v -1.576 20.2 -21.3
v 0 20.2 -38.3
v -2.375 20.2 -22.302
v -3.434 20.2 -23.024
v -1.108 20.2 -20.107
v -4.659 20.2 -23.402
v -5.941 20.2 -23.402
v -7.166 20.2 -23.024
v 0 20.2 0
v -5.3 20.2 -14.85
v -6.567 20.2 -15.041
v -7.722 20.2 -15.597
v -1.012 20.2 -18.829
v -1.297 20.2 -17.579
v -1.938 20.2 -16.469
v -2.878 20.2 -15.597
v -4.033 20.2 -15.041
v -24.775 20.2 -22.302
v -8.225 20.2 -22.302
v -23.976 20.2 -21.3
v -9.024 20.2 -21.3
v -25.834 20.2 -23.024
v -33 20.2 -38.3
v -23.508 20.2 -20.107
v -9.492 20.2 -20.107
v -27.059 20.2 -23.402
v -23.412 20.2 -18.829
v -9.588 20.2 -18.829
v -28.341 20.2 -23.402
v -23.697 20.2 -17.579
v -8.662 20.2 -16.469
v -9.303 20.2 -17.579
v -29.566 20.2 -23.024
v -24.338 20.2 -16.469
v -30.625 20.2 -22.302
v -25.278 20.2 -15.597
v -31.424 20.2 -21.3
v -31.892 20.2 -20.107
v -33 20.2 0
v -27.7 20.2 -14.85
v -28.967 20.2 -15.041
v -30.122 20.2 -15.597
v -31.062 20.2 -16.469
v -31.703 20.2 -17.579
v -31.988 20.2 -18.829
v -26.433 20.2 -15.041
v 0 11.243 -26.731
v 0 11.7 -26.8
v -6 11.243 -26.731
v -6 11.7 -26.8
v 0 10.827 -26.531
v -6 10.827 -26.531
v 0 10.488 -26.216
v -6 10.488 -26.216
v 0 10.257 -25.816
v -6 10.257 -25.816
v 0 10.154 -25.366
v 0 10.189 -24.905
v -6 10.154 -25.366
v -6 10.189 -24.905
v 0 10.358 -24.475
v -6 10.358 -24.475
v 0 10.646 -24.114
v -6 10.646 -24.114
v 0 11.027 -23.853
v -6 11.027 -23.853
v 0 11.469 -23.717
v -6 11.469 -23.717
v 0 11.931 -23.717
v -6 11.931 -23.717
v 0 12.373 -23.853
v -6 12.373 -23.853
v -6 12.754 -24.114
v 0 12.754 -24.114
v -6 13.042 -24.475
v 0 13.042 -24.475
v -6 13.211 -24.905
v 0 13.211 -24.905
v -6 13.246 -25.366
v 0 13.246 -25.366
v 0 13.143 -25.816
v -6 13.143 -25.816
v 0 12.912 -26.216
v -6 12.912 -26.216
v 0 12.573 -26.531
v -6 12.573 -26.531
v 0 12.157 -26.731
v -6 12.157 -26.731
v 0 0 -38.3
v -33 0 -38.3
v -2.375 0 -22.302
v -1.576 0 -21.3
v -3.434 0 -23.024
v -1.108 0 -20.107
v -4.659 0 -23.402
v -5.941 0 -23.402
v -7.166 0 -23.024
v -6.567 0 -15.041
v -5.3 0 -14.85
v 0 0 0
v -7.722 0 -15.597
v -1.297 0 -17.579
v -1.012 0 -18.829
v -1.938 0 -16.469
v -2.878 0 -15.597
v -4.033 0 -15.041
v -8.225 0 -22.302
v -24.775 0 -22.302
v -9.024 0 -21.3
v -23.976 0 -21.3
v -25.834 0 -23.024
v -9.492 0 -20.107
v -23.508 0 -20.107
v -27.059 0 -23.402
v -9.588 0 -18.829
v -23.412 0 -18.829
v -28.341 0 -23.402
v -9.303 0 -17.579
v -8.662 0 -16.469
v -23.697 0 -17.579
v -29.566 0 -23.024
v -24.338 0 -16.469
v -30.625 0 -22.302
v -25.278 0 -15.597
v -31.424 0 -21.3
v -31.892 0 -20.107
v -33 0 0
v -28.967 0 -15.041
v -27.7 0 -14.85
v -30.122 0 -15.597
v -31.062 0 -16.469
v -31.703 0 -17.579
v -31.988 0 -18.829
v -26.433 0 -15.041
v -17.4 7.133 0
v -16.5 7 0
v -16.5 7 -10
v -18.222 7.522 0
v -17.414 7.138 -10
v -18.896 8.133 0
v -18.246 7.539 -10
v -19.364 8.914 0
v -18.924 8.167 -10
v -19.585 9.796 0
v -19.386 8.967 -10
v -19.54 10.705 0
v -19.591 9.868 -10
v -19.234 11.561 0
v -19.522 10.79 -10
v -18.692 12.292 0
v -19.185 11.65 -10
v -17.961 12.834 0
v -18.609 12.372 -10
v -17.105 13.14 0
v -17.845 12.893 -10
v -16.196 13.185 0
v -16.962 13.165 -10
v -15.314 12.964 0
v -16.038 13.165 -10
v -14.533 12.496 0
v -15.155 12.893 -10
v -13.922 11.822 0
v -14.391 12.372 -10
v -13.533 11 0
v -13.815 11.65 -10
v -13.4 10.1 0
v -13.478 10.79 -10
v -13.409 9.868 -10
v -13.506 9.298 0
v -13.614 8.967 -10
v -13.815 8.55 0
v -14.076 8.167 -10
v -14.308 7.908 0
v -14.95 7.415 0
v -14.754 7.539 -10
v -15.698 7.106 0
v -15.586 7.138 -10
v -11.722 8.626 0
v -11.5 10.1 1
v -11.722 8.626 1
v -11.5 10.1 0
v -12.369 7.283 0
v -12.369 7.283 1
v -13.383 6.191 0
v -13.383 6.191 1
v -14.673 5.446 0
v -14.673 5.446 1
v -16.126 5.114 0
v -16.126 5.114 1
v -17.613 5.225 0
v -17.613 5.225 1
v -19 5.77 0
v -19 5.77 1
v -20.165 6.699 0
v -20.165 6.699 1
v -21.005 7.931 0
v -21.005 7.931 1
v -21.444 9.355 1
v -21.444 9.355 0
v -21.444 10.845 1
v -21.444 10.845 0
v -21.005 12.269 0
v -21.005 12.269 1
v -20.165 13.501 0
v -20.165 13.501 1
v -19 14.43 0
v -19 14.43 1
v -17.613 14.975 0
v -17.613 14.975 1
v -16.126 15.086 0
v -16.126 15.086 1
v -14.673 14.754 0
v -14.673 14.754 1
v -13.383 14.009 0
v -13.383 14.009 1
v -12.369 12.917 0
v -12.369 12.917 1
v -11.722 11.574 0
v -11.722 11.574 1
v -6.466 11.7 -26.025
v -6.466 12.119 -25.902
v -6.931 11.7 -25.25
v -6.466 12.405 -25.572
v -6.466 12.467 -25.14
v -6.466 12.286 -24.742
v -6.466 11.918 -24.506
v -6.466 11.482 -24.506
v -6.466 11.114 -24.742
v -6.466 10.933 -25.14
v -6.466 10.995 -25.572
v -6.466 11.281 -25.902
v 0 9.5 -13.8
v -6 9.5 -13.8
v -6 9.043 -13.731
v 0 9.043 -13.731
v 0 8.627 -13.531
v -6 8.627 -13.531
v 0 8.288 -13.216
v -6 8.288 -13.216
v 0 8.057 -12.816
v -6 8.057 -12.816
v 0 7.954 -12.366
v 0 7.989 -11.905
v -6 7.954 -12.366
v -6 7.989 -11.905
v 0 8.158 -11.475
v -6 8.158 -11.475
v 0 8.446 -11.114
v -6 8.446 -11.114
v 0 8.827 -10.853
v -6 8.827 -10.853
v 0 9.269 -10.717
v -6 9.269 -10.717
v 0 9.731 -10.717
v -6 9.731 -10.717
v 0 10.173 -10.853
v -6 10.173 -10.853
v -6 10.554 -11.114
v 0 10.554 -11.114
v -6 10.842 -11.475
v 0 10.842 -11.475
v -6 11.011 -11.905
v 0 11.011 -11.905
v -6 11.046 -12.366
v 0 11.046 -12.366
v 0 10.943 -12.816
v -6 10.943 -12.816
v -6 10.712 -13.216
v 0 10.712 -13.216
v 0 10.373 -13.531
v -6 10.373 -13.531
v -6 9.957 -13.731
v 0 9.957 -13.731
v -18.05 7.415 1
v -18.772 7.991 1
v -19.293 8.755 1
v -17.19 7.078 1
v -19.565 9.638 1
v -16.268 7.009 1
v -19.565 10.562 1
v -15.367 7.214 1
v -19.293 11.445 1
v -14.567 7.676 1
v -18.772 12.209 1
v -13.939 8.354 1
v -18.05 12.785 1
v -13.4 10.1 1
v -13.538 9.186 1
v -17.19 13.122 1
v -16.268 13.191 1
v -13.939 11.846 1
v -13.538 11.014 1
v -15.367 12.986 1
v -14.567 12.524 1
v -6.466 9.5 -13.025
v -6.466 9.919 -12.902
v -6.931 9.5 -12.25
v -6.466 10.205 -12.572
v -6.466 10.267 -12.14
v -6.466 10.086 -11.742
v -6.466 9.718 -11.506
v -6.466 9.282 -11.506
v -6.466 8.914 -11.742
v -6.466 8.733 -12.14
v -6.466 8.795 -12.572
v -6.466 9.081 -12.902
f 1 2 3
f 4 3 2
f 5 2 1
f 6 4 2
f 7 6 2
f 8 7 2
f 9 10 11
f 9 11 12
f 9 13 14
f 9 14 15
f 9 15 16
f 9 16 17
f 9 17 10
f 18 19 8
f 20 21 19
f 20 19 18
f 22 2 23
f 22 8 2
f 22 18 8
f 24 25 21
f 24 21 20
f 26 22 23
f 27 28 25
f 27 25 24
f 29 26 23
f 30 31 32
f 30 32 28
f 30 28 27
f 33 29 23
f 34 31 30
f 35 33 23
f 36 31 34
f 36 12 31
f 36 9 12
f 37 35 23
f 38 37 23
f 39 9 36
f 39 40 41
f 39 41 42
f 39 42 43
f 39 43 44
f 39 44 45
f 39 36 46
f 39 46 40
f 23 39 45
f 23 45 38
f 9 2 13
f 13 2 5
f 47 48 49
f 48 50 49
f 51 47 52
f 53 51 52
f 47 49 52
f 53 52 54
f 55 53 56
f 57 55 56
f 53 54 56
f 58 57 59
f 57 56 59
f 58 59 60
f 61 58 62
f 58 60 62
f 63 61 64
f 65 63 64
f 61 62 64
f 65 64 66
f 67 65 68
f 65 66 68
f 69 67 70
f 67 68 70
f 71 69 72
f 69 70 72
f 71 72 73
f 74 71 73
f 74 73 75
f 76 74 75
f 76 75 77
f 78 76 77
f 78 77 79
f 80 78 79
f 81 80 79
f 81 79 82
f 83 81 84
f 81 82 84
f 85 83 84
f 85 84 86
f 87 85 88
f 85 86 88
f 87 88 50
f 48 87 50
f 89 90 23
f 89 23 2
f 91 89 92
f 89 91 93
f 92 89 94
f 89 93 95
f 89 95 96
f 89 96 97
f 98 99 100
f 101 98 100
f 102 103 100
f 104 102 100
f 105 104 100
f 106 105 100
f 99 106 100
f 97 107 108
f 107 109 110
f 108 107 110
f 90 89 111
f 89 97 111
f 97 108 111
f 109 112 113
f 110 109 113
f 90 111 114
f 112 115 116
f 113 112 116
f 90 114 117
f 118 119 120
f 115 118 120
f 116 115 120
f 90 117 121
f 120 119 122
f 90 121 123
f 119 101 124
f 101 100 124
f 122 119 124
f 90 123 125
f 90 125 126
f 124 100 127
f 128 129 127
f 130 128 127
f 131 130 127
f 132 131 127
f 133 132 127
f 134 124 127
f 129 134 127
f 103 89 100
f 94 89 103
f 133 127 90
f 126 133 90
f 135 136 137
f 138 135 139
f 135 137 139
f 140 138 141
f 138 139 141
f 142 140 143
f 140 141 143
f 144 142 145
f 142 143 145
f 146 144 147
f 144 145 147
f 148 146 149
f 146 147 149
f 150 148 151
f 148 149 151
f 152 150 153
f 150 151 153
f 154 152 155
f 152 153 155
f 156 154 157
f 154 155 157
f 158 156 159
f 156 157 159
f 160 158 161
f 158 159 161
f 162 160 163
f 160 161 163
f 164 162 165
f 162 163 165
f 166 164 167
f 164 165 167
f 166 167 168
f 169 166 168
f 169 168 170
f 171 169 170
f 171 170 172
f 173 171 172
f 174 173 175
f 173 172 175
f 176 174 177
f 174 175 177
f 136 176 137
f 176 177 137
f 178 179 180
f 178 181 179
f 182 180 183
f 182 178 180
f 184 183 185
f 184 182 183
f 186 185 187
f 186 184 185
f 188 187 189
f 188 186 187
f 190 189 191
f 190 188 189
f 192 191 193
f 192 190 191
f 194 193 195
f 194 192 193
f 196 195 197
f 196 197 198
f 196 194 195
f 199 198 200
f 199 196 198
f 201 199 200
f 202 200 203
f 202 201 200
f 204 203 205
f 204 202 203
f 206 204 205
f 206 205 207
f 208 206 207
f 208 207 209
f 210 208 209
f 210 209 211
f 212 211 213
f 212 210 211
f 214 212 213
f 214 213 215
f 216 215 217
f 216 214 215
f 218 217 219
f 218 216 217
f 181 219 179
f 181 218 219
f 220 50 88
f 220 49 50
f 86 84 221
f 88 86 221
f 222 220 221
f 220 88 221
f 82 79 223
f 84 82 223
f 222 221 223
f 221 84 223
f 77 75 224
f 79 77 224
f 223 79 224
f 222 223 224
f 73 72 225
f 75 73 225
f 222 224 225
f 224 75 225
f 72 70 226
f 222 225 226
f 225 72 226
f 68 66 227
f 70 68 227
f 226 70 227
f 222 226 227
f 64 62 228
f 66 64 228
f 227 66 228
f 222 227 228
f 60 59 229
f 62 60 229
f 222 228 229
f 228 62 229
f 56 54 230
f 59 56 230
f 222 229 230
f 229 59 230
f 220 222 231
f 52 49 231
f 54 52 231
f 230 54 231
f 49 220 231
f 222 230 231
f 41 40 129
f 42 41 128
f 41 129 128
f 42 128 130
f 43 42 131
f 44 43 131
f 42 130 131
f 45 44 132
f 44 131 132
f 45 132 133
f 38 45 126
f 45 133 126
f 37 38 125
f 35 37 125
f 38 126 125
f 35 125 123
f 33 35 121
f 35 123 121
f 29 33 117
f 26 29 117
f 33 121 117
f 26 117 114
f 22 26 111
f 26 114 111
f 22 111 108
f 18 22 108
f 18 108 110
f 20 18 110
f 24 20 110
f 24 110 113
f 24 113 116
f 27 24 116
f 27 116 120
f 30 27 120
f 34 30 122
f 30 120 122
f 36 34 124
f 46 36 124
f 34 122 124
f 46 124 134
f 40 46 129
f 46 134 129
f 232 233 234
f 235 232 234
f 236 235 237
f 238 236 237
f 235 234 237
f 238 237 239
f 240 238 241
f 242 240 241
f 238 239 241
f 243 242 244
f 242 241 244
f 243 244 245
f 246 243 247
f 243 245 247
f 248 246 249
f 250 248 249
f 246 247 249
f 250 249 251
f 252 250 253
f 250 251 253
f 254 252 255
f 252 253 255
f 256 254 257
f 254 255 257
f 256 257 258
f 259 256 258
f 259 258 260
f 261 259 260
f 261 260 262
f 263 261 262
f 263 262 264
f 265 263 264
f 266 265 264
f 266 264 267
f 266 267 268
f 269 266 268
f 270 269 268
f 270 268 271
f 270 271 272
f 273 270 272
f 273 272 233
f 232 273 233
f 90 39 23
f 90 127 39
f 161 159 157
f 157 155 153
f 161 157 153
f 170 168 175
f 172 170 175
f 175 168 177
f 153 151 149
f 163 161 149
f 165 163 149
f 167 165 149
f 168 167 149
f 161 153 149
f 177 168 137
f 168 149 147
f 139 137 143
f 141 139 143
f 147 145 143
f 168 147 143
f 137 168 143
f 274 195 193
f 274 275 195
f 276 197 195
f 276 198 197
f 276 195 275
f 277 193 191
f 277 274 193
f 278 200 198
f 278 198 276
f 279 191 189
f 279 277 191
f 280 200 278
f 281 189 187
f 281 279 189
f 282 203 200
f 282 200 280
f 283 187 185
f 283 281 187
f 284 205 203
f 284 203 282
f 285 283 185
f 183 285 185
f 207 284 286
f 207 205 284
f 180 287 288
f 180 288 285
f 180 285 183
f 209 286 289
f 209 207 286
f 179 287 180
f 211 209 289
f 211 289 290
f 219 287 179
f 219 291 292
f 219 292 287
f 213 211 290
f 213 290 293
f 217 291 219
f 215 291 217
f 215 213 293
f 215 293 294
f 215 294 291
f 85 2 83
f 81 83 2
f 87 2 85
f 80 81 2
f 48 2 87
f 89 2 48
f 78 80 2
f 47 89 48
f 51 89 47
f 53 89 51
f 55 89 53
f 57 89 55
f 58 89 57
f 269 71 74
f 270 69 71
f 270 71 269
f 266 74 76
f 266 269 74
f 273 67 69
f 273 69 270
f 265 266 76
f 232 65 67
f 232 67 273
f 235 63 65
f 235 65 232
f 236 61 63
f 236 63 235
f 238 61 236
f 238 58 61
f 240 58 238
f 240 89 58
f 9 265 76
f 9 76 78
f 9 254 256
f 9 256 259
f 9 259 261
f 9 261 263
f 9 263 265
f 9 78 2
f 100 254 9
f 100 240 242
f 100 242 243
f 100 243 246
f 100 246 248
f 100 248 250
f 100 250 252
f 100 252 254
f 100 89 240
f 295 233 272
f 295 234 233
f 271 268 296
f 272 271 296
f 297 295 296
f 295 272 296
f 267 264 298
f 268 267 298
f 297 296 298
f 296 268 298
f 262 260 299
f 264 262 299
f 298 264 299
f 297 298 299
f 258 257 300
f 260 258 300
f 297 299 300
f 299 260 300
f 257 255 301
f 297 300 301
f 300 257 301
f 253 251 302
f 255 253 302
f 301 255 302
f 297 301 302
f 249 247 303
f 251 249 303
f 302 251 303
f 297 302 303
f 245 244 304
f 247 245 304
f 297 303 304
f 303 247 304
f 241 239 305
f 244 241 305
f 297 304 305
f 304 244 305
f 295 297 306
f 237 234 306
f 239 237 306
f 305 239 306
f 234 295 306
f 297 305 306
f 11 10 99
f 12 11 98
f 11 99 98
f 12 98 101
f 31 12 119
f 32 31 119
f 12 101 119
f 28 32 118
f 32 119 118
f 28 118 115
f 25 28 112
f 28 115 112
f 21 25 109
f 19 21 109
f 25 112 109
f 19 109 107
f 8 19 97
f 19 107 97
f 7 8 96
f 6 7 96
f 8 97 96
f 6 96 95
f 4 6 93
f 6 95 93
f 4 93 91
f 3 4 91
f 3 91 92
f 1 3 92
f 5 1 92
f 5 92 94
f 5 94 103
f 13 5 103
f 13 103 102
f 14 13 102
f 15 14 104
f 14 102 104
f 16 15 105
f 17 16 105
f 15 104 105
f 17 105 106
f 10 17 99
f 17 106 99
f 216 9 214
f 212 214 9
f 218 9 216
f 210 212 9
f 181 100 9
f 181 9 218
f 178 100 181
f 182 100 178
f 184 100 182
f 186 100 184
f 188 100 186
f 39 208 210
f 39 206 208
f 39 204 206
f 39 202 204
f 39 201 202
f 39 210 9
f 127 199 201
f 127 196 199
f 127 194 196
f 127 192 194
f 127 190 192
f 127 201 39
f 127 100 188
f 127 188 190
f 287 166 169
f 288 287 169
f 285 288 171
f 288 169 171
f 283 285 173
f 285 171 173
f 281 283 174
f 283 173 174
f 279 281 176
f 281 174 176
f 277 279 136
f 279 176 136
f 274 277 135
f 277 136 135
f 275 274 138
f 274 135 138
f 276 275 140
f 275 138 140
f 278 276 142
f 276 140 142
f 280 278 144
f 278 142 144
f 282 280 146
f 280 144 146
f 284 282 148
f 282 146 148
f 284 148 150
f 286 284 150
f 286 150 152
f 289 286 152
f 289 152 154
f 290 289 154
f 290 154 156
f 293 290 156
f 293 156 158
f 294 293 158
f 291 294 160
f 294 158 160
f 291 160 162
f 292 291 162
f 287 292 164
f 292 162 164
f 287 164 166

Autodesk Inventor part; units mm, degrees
ref_plane "YZ Plane" through (0, 0, 0) normal (1, 0, 0) x (0, 1, 0)
ref_plane "XZ Plane" through (0, 0, 0) normal (0, 1, 0) x (-1, 0, 0)
ref_plane "XY Plane" through (0, 0, 0) normal (0, 0, 1) x (1, 0, 0)
sketch "スケッチ1" plane through (0, 0, 0) normal (0, 1, 0) x (-1, 0, 0)
  line L0 (0, 0) -> (33, 0)
  line L1 (33, 0) -> (33, -38.3)
  line L2 (33, -38.3) -> (0, -38.3)
  line L3 (0, -38.3) -> (0, 0)
  dimension "d0" = 33
  dimension "d1" = 38.3
extrude "押し出し1" add sketch "スケッチ1" along normal blind 20.2
sketch "スケッチ2" plane through (0, 20.2, 0) normal (0, 1, 0) x (1, 0, 0)
  line L0 (-33, 38.3) -> (-33, 0) projected
  line L1 (-33, 19.15) -> (0, 19.15)
  line L2 (0, 0) -> (0, 38.3) projected
  point P0 (-27.7, 19.15)
  point P1 (-5.3, 19.15)
  dimension "d4" = 5.3
  dimension "d5" = 5.3
sketch "スケッチ3" plane through (0, 20.2, 0) normal (0, 1, 0) x (1, 0, 0)
  point P0 (0, 0)
sketch "スケッチ4" plane through (0, 20.2, 0) normal (0, 1, 0) x (1, 0, 0)
  circle A0 centre (-5.3, 19.15) radius 4.3
  circle A1 centre (-27.7, 19.15) radius 4.3
  point P0 (0, 0)
  dimension "d6" = 8.6
  dimension "d7" = 8.6
hole "穴1" at (-5.3, 20.2, -19.15) direction (0, -1, 0) diameter 8.6 end through all
hole "穴2" at (-27.7, 20.2, -19.15) direction (0, -1, 0) diameter 8.6 end through all
sketch "スケッチ5" plane through (-33, 0, 0) normal (0, 0, 1) x (1, 0, 0)
  line L0 (33, 20.2) -> (0, 20.2) projected
  line L1 (16.5, 20.2) -> (16.5, 0)
  circle A0 centre (16.5, 10.1) radius 5
  circle A1 centre (16.5, 10.1) radius 3.1
  point P0 (33, 0)
  dimension "d22" = 10
  dimension "d23" = 6.2
sketch "スケッチ6" plane through (0, 0, 0) normal (1, 0, 0) x (0, 0, -1)
  line L0 (0, 0) -> (38.3, 0) projected
  line L1 (12.25, 0) -> (12.25, 20.2)
  line L2 (0, 20.2) -> (38.3, 20.2) projected
  line L3 (25.25, 0) -> (25.25, 20.2)
  point P0 (12.25, 9.5)
  point P1 (25.25, 11.7)
  dimension "d26" = 9.5
  dimension "d27" = 8.5
sketch "スケッチ7" plane through (0, 0, 0) normal (1, 0, 0) x (0, 0, -1)
  point P0 (0, 0)
hole "穴3" at (0, 9.5, -12.25) at (0, 11.7, -25.25) direction (-1, 0, 0) diameter 3.1 depth 6 tip angle 118
extrude "押し出し3" add sketch "スケッチ5" along normal blind 1 contours A0 L1 A1 | L1 A1 A0
sketch "スケッチ8" plane through (-33, 0, 0) normal (0, 0, 1) x (1, 0, 0)
  line L0 (0, 20.2) -> (33, 20.2) projected
  line L1 (16.5, 20.2) -> (16.5, 0)
  line L2 (33, 0) -> (0, 0) projected
  point P0 (16.5, 10.1)
hole "穴4" at (-16.5, 10.1, 0) direction (0, 0, -1) diameter 6.2 depth 10
properties part number "コガネイ_BDA16x5"
